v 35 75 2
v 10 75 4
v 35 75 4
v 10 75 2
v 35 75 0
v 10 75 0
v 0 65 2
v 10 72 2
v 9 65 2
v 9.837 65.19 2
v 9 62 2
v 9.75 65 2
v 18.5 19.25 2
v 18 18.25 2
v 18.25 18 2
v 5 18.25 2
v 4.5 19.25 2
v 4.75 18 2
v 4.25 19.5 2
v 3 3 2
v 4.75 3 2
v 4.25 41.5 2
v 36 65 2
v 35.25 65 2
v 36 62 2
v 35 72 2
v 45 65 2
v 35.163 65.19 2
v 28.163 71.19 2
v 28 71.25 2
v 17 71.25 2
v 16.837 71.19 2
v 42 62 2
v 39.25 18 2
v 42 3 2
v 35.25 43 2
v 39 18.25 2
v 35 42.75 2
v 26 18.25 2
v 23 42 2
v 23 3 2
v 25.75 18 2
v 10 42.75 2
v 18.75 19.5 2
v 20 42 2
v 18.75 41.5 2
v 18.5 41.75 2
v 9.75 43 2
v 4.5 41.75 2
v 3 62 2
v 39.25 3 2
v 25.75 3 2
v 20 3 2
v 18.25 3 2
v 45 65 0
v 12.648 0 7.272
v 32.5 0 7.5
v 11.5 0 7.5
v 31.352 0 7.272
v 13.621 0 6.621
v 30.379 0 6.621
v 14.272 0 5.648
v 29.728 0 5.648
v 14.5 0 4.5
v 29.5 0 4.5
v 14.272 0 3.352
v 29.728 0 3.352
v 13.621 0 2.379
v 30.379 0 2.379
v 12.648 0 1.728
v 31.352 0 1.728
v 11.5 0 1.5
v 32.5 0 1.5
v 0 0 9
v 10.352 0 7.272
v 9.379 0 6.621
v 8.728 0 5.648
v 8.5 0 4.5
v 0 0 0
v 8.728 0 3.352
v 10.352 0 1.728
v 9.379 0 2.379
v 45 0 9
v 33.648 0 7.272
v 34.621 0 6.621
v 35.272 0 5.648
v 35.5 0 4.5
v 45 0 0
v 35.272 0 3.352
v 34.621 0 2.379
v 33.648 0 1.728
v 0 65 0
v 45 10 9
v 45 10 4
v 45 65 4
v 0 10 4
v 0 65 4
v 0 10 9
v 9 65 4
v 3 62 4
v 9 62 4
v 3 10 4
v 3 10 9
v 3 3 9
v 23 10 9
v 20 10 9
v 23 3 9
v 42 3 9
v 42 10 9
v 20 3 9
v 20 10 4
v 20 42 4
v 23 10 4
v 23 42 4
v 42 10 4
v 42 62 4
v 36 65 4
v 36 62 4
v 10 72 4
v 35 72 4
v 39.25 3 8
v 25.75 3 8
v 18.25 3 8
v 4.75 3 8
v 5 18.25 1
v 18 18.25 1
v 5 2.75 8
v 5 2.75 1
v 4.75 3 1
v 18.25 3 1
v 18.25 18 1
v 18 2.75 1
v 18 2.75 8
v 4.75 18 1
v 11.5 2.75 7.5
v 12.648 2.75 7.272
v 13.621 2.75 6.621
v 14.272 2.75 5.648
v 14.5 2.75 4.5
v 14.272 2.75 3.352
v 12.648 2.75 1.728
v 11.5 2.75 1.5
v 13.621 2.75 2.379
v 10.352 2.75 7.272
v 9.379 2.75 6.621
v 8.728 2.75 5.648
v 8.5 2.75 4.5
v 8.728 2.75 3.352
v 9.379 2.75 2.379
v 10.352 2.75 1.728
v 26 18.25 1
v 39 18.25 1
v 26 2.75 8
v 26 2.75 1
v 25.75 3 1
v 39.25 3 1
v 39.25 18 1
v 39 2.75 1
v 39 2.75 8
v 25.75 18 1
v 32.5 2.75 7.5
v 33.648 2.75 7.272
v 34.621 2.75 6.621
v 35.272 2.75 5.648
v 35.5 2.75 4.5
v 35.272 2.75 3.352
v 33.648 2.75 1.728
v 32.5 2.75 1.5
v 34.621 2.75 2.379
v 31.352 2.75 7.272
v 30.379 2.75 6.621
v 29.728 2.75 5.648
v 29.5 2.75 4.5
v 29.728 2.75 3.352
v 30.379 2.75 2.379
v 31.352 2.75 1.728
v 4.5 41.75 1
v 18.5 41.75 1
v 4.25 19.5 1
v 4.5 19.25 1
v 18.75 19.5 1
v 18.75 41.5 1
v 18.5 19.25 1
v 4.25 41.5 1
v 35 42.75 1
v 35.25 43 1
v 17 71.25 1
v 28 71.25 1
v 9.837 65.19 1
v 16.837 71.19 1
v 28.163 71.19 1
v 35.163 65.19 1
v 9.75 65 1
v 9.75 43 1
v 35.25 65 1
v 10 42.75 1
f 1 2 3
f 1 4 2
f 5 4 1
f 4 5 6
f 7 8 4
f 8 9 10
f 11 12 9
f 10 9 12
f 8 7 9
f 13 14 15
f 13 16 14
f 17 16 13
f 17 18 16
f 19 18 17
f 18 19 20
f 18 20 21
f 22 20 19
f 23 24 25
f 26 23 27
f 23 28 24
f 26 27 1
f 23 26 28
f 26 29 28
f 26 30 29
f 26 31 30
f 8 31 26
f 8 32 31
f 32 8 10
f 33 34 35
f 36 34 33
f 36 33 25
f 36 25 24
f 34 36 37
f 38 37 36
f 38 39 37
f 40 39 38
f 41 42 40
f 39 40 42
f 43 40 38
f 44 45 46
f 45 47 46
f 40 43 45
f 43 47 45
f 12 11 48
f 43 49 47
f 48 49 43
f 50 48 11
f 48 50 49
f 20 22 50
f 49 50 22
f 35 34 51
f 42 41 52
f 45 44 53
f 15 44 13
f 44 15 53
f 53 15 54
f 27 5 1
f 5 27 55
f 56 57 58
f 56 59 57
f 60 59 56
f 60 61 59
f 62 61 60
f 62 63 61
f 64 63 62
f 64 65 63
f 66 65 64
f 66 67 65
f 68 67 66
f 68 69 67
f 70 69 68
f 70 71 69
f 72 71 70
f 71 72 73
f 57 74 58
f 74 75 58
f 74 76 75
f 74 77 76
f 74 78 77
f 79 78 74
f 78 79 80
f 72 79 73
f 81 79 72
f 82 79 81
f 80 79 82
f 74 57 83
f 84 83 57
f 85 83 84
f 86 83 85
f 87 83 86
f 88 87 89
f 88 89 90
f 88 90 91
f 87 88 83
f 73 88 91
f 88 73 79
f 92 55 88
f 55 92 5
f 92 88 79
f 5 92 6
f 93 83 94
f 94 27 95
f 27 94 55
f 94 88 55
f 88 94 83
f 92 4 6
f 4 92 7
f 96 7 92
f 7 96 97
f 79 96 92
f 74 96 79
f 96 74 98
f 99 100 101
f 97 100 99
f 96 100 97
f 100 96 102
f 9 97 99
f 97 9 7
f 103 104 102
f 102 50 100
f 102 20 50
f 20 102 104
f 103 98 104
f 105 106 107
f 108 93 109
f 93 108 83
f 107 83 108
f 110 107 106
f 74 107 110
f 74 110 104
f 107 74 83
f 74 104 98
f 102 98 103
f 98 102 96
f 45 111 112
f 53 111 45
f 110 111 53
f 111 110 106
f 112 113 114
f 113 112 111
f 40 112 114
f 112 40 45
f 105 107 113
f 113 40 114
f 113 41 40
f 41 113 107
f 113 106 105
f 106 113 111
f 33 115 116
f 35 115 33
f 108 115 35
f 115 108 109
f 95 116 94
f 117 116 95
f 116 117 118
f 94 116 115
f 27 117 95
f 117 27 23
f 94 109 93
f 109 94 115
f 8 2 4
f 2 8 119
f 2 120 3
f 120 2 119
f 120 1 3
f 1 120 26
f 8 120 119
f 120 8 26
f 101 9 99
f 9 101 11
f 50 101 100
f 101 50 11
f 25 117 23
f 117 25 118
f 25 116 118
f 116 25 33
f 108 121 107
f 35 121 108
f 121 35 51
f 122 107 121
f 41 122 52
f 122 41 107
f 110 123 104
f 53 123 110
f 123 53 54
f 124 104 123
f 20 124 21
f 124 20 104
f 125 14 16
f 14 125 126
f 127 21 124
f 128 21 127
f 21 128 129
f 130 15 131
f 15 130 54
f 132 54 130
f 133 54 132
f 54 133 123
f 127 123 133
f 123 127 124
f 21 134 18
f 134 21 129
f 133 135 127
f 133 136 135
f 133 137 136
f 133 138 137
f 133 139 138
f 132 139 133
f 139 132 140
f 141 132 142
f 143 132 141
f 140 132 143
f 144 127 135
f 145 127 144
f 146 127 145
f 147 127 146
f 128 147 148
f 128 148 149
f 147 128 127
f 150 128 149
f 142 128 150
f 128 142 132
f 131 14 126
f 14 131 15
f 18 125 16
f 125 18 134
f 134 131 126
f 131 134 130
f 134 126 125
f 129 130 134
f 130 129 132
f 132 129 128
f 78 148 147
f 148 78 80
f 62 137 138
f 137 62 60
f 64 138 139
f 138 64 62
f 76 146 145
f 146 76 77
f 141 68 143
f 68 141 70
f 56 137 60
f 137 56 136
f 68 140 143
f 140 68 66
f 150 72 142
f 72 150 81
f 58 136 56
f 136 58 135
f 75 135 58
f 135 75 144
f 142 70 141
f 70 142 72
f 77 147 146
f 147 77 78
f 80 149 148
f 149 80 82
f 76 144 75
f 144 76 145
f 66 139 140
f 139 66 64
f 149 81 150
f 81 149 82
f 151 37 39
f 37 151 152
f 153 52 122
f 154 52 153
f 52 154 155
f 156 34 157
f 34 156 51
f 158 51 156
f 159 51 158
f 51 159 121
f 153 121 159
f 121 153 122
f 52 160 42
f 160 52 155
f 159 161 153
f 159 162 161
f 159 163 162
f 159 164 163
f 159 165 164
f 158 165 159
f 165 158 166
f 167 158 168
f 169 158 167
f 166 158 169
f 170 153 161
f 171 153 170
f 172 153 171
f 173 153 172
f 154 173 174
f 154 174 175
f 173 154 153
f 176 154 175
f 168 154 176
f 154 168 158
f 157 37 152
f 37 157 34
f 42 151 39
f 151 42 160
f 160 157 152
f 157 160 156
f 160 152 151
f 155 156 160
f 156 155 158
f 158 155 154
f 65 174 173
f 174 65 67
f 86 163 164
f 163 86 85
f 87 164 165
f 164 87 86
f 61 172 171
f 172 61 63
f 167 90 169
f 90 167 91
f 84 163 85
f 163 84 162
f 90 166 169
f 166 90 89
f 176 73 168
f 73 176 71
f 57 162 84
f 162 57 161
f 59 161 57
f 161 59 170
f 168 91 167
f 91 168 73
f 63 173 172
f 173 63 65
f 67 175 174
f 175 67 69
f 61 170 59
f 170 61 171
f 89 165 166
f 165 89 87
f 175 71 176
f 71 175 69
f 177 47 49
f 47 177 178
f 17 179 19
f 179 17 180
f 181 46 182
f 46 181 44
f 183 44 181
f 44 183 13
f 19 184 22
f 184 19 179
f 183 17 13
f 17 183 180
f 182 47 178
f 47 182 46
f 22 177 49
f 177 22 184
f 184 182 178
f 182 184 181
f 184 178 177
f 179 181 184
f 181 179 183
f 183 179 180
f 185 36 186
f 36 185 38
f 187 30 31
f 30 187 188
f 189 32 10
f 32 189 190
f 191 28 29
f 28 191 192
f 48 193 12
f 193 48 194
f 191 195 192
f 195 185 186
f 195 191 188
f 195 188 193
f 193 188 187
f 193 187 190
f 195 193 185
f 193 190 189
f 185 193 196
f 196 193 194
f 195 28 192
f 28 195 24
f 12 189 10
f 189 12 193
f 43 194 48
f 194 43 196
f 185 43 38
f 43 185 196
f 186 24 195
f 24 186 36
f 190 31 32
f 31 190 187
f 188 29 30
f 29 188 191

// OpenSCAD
/*
// Base 1 plate
B1p=[ [0,0], [55,0], [55,70], [45,80],
[10,80], [0,70] ];
translate([0,0,0]) color("gray")
linear_extrude(height=1)
polygon(points=B1p);
*/
tol=0.25;
extra=4;

difference(){
    
union(){ // make the 3 ribs part of the base

// Base 2 plate
B1p=[ [0,0], [45,0], [45,65], [35,75],
[10,75], [0,65] ];
translate([0,0,0]) color("gray")
linear_extrude(height=2)
polygon(points=B1p);

// rib1 left
translate([0,0,0]) color("cyan")
linear_extrude(height=4)
square(size=[3,65]);
// rib1b left
translate([0,0,0]) color("cyan")
linear_extrude(height=9)
square(size=[3,10]);
// rig2 center
translate([20,0,0]) color("cyan")
linear_extrude(height=4)
square(size=[3,42]);
// rig2b center
translate([20,0,0]) color("cyan")
linear_extrude(height=9)
square(size=[3,10]);
//rib3 right
translate([42,0,0]) color("cyan")
linear_extrude(height=4)
square(size=[3,65]);
//rib3b right
translate([42,0,0]) color("cyan")
linear_extrude(height=9)
square(size=[3,10]);
//rib4 top
translate([10,72,0]) color("cyan")
linear_extrude(height=4)
square(size=[25,3]);
//rib5 top left
translate([0,62,0]) color("cyan")
linear_extrude(height=4)
square(size=[9,3]);
//rib6 top right
translate([36,62,0]) color("cyan")
linear_extrude(height=4)
square(size=[9,3]);

//rib7 base
translate([0,0,0]) color("pink")
linear_extrude(height=9)
square(size=[45,3]);

} // end of union


union(){
// Toggle Switch 1
translate([5,3,1]) color("red"){
    linear_extrude(height=7) 
    offset(r=tol)
     square(size=[13, 15]);
    
    translate([6.5,0,3.5]) rotate([90,0,0]) cylinder(r=3,h=10,$fn=16);
}

// Toggle Switch 2
translate([26,3,1]) color("red"){
    linear_extrude(height=7) 
    offset(r=tol)
     square(size=[13, 15]);
    
    translate([6.5,0,3.5]) rotate([90,0,0]) cylinder(r=3,h=10,$fn=16);
}

// Mic
translate([4.5,19.5,1]) color("green") {
    linear_extrude(height=1.7) 
    offset(r=tol)
     square(size=[14, 22]);
        
    linear_extrude(height=8) 
     offset(r=-3)
      square(size=[14, 22]);
 
}

// Xbee
translate([10,43,1]) color("orange") {
pxb=[ [0,0], [25,0], [25,22], [18,28], [7,28], [0,22] ];
    linear_extrude(height=8) 
    offset(r=tol)
     polygon(points=pxb);
}
}

}
